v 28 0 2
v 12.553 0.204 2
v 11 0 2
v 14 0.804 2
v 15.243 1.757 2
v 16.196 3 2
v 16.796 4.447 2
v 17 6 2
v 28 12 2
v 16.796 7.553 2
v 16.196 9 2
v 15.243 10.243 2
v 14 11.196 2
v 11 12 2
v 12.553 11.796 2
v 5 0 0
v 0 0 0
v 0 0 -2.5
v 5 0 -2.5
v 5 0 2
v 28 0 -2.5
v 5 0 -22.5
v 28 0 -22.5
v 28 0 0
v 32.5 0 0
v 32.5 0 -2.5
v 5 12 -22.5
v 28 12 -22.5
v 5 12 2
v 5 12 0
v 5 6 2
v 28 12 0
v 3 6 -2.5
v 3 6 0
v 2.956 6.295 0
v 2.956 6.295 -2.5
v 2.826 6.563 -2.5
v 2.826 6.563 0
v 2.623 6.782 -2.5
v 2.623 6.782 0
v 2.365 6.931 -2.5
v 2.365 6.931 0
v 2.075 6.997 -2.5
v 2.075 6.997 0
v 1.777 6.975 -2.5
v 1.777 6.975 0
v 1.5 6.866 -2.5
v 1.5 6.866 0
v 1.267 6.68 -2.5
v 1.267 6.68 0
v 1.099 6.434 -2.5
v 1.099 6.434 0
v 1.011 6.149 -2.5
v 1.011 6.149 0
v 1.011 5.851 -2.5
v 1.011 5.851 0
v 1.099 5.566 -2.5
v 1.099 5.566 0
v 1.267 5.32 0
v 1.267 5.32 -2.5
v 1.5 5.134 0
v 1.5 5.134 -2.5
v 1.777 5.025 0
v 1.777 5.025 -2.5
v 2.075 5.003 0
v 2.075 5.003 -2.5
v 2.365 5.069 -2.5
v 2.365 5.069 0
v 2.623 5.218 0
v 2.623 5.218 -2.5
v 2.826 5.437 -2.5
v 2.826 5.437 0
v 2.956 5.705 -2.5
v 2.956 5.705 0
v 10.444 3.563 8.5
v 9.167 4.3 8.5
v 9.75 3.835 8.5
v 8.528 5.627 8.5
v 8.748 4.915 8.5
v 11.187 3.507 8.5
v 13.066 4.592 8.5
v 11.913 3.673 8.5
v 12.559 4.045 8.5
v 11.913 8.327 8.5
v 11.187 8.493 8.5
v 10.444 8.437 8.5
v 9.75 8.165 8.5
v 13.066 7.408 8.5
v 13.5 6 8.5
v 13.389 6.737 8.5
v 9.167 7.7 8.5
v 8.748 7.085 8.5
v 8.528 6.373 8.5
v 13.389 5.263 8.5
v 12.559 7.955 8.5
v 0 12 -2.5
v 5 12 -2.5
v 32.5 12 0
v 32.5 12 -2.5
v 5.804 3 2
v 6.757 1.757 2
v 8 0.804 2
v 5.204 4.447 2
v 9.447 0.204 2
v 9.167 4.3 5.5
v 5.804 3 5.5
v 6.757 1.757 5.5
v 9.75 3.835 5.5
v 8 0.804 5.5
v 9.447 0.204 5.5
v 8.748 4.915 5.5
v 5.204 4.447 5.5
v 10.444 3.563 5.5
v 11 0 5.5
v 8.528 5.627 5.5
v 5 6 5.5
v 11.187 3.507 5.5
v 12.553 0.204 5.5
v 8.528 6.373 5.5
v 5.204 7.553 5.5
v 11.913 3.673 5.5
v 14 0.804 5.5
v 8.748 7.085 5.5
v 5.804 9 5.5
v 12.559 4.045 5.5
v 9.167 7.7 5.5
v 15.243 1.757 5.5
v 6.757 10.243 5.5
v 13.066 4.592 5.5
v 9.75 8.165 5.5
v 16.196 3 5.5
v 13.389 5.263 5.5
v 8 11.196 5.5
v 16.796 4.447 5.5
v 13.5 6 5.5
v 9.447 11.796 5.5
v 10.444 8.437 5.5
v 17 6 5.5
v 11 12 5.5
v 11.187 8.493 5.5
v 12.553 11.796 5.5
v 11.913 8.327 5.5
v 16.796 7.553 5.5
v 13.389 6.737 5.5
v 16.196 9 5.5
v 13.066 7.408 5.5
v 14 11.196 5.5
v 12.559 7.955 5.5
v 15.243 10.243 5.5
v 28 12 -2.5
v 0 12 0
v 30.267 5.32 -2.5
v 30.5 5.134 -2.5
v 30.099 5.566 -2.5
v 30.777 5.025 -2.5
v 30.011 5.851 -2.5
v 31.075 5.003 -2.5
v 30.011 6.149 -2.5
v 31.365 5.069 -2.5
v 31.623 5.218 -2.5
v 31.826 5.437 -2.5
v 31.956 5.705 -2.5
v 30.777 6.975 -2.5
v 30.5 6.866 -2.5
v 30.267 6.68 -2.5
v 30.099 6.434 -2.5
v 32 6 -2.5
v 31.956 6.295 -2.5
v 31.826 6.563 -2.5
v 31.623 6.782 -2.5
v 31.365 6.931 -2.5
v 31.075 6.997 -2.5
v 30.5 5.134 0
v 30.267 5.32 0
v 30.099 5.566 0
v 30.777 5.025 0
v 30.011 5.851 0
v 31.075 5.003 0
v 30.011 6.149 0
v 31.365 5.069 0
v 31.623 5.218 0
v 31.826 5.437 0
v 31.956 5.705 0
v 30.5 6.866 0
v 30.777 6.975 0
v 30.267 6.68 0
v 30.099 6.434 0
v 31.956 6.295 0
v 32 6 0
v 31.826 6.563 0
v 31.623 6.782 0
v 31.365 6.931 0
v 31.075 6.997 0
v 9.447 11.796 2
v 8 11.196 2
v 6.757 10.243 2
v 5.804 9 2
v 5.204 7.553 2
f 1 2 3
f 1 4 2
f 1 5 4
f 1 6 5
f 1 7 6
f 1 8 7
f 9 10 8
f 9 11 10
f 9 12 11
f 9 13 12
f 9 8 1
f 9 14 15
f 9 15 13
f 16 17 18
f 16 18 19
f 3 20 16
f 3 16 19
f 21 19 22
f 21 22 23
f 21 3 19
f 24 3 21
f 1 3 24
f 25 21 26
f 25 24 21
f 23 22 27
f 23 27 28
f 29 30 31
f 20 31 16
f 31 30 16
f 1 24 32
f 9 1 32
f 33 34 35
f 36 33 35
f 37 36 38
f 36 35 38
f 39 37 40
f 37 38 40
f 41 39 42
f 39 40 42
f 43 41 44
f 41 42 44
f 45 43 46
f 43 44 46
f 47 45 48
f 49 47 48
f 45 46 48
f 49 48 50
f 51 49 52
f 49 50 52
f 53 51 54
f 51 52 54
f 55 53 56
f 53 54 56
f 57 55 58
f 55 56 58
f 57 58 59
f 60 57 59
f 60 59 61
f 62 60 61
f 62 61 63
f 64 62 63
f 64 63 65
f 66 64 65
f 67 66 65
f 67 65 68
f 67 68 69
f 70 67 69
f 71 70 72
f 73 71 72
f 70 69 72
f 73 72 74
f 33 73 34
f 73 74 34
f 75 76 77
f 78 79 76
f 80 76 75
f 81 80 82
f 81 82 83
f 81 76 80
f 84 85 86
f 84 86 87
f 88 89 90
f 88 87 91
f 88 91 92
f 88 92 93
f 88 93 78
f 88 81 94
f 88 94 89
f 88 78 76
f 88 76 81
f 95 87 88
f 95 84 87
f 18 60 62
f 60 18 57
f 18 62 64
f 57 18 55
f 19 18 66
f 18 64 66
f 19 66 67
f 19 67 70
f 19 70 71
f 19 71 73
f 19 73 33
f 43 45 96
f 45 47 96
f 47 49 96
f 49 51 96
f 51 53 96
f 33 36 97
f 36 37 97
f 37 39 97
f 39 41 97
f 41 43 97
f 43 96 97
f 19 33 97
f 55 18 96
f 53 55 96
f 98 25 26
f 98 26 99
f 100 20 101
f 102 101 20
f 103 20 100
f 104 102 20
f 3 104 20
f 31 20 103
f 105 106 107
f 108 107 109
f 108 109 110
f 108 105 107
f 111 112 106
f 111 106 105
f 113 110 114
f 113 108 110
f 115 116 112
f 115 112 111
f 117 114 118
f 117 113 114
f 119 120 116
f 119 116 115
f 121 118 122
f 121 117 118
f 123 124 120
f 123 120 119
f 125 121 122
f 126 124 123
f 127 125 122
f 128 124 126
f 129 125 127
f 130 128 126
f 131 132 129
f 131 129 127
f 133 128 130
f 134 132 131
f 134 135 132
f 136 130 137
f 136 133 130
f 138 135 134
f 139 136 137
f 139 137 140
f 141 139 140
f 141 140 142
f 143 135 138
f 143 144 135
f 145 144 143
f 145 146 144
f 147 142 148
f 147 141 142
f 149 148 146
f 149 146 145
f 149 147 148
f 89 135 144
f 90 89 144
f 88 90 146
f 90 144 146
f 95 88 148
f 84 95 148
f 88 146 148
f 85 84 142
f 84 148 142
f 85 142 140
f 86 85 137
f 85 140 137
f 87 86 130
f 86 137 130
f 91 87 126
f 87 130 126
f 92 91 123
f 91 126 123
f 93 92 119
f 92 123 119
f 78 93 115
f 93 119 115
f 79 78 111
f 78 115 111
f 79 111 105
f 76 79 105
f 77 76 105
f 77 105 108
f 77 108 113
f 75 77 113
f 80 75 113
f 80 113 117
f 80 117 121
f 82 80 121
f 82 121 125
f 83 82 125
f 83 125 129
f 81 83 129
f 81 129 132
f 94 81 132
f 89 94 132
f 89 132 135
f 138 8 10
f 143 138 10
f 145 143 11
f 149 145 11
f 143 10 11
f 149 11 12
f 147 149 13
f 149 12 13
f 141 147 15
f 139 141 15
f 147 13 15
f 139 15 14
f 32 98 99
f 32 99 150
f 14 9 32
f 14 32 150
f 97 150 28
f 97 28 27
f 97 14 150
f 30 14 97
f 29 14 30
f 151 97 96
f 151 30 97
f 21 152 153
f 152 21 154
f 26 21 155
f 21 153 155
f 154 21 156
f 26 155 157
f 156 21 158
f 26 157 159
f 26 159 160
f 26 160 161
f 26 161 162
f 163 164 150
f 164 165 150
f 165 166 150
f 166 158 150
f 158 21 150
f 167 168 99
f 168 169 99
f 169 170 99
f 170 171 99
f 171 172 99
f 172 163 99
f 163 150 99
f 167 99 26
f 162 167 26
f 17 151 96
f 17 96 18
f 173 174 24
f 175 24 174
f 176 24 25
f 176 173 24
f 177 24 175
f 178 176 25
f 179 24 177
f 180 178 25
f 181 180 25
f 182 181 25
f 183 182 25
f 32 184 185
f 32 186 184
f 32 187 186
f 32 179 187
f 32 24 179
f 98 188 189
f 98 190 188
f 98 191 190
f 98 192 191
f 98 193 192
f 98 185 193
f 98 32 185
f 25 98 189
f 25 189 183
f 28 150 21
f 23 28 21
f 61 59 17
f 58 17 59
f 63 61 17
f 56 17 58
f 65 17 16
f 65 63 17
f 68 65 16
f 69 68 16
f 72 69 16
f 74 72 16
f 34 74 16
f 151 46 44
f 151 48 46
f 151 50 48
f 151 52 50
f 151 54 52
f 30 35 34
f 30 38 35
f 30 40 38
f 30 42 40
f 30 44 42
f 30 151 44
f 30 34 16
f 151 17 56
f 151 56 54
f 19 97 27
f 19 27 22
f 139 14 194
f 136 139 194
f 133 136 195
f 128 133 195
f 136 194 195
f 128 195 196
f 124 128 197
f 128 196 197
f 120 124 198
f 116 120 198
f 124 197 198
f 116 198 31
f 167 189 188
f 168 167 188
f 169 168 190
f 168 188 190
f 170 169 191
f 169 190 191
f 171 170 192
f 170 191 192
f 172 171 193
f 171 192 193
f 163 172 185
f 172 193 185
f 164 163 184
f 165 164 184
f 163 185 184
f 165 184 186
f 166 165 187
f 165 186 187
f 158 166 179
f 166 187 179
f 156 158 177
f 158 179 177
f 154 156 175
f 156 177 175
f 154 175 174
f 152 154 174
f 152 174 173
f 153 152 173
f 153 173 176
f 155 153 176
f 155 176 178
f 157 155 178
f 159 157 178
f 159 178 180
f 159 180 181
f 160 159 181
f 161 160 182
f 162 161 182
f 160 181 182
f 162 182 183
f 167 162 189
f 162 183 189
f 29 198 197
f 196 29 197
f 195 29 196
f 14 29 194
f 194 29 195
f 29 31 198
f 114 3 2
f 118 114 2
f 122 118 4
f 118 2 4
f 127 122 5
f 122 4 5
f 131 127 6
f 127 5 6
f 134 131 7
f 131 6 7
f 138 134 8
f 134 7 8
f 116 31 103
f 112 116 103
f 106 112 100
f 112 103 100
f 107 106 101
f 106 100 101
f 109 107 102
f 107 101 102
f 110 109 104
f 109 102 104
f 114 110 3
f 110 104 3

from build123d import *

# Parameters (mm, degrees)
F0_W     = 4.5
F0_H     = 12
F0_R     = 1
F0_R_2   = 2.5
F1_DEPTH = 2.5
F2_DEPTH = 2
F3_DEPTH = 22.5
F4_R     = 2.5
F5_DEPTH = 3.5
F6_DEPTH = 6.5
F8_W     = 23
F8_H     = 12
F9_DEPTH = 20


with BuildPart() as f1:
    # F0 (on Top) → F1 (new body)
    with BuildSketch(Plane.XY):
        with Locations((30.25, 6)):
            Rectangle(F0_W, F0_H)
        with Locations((31, 6)):
            Circle(F0_R, mode=Mode.SUBTRACT)
        with BuildLine():
            ThreePointArc((17, 6), (15.2426406871, 1.7573593129), (11, 0))
            Line((11, 0), (28, 0))
            Line((28, 0), (28, 12))
            Line((28, 12), (11, 12))
            ThreePointArc((11, 12), (15.2426406871, 10.2426406871), (17, 6))
        make_face()
        with BuildLine():
            Line((5, 12), (5, 6))
            ThreePointArc((5, 6), (6.7573593129, 10.2426406871), (11, 12))
            Line((11, 12), (5, 12))
        make_face()
        with BuildLine():
            Line((5, 6), (5, 0))
            Line((5, 0), (11, 0))
            ThreePointArc((11, 0), (6.7573593129, 1.7573593129), (5, 6))
        make_face()
        Polygon((0, 12), (0, 0), (5, 0), (5, 6), (5, 12), align=None)
        with Locations((2, 6)):
            Circle(F0_R, mode=Mode.SUBTRACT)
        with BuildLine():
            ThreePointArc((5, 6), (6.7573593129, 1.7573593129), (11, 0))
            ThreePointArc((11, 0), (15.2426406871, 1.7573593129), (17, 6))
            ThreePointArc((17, 6), (15.2426406871, 10.2426406871), (11, 12))
            ThreePointArc((11, 12), (6.7573593129, 10.2426406871), (5, 6))
        make_face()
        with Locations((11, 6)):
            Circle(F0_R_2, mode=Mode.SUBTRACT)
        with Locations((11, 6)):
            Circle(F0_R_2)
    extrude(amount=-F1_DEPTH)

    # F0 (on Top) → F2 (join)
    with BuildSketch(Plane.XY):
        with BuildLine():
            ThreePointArc((17, 6), (15.2426406871, 1.7573593129), (11, 0))
            Line((11, 0), (28, 0))
            Line((28, 0), (28, 12))
            Line((28, 12), (11, 12))
            ThreePointArc((11, 12), (15.2426406871, 10.2426406871), (17, 6))
        make_face()
        with BuildLine():
            Line((5, 12), (5, 6))
            ThreePointArc((5, 6), (6.7573593129, 10.2426406871), (11, 12))
            Line((11, 12), (5, 12))
        make_face()
        with BuildLine():
            Line((5, 6), (5, 0))
            Line((5, 0), (11, 0))
            ThreePointArc((11, 0), (6.7573593129, 1.7573593129), (5, 6))
        make_face()
        with BuildLine():
            ThreePointArc((5, 6), (6.7573593129, 1.7573593129), (11, 0))
            ThreePointArc((11, 0), (15.2426406871, 1.7573593129), (17, 6))
            ThreePointArc((17, 6), (15.2426406871, 10.2426406871), (11, 12))
            ThreePointArc((11, 12), (6.7573593129, 10.2426406871), (5, 6))
        make_face()
        with Locations((11, 6)):
            Circle(F0_R_2, mode=Mode.SUBTRACT)
        with Locations((11, 6)):
            Circle(F0_R_2)
    extrude(amount=F2_DEPTH)

    # F4 (on face) → F5 (join)
    with BuildSketch(Plane.XY.offset(2)):
        with BuildLine():
            ThreePointArc((11, 0), (15.2426406871, 1.7573593129), (17, 6))
            ThreePointArc((17, 6), (15.2426406871, 10.2426406871), (11, 12))
            ThreePointArc((11, 12), (6.7573593129, 10.2426406871), (5, 6))
            ThreePointArc((5, 6), (6.7573593129, 1.7573593129), (11, 0))
        make_face()
        with Locations((11, 6)):
            Circle(F4_R, mode=Mode.SUBTRACT)
    extrude(amount=F5_DEPTH)

    # F6 (add): a face of the model
    f6_faces = [f1.faces().sort_by_distance(p)[0] for p in [
        (11, 6, 2),
    ]]
    extrude(f6_faces, amount=F6_DEPTH)

    # F8 (on face) → F9 (join)
    with BuildSketch(Plane(origin=(0, 0, -2.5), x_dir=(1, 0, 0), z_dir=(0, 0, -1))):
        with Locations((16.5, -6)):
            Rectangle(F8_W, F8_H)
    extrude(amount=F9_DEPTH)


with BuildPart() as f3:
    # F0 (on Top) → F3 (new body)
    with BuildSketch(Plane.XY):
        with BuildLine():
            ThreePointArc((17, 6), (15.2426406871, 1.7573593129), (11, 0))
            Line((11, 0), (28, 0))
            Line((28, 0), (28, 12))
            Line((28, 12), (11, 12))
            ThreePointArc((11, 12), (15.2426406871, 10.2426406871), (17, 6))
        make_face()
        with BuildLine():
            ThreePointArc((5, 6), (6.7573593129, 1.7573593129), (11, 0))
            ThreePointArc((11, 0), (15.2426406871, 1.7573593129), (17, 6))
            ThreePointArc((17, 6), (15.2426406871, 10.2426406871), (11, 12))
            ThreePointArc((11, 12), (6.7573593129, 10.2426406871), (5, 6))
        make_face()
        with Locations((11, 6)):
            Circle(F0_R_2, mode=Mode.SUBTRACT)
        with Locations((11, 6)):
            Circle(F0_R_2)
        with BuildLine():
            Line((5, 12), (5, 6))
            ThreePointArc((5, 6), (6.7573593129, 10.2426406871), (11, 12))
            Line((11, 12), (5, 12))
        make_face()
        with BuildLine():
            Line((5, 6), (5, 0))
            Line((5, 0), (11, 0))
            ThreePointArc((11, 0), (6.7573593129, 1.7573593129), (5, 6))
        make_face()
    extrude(amount=-F3_DEPTH)


solid = f1.part
